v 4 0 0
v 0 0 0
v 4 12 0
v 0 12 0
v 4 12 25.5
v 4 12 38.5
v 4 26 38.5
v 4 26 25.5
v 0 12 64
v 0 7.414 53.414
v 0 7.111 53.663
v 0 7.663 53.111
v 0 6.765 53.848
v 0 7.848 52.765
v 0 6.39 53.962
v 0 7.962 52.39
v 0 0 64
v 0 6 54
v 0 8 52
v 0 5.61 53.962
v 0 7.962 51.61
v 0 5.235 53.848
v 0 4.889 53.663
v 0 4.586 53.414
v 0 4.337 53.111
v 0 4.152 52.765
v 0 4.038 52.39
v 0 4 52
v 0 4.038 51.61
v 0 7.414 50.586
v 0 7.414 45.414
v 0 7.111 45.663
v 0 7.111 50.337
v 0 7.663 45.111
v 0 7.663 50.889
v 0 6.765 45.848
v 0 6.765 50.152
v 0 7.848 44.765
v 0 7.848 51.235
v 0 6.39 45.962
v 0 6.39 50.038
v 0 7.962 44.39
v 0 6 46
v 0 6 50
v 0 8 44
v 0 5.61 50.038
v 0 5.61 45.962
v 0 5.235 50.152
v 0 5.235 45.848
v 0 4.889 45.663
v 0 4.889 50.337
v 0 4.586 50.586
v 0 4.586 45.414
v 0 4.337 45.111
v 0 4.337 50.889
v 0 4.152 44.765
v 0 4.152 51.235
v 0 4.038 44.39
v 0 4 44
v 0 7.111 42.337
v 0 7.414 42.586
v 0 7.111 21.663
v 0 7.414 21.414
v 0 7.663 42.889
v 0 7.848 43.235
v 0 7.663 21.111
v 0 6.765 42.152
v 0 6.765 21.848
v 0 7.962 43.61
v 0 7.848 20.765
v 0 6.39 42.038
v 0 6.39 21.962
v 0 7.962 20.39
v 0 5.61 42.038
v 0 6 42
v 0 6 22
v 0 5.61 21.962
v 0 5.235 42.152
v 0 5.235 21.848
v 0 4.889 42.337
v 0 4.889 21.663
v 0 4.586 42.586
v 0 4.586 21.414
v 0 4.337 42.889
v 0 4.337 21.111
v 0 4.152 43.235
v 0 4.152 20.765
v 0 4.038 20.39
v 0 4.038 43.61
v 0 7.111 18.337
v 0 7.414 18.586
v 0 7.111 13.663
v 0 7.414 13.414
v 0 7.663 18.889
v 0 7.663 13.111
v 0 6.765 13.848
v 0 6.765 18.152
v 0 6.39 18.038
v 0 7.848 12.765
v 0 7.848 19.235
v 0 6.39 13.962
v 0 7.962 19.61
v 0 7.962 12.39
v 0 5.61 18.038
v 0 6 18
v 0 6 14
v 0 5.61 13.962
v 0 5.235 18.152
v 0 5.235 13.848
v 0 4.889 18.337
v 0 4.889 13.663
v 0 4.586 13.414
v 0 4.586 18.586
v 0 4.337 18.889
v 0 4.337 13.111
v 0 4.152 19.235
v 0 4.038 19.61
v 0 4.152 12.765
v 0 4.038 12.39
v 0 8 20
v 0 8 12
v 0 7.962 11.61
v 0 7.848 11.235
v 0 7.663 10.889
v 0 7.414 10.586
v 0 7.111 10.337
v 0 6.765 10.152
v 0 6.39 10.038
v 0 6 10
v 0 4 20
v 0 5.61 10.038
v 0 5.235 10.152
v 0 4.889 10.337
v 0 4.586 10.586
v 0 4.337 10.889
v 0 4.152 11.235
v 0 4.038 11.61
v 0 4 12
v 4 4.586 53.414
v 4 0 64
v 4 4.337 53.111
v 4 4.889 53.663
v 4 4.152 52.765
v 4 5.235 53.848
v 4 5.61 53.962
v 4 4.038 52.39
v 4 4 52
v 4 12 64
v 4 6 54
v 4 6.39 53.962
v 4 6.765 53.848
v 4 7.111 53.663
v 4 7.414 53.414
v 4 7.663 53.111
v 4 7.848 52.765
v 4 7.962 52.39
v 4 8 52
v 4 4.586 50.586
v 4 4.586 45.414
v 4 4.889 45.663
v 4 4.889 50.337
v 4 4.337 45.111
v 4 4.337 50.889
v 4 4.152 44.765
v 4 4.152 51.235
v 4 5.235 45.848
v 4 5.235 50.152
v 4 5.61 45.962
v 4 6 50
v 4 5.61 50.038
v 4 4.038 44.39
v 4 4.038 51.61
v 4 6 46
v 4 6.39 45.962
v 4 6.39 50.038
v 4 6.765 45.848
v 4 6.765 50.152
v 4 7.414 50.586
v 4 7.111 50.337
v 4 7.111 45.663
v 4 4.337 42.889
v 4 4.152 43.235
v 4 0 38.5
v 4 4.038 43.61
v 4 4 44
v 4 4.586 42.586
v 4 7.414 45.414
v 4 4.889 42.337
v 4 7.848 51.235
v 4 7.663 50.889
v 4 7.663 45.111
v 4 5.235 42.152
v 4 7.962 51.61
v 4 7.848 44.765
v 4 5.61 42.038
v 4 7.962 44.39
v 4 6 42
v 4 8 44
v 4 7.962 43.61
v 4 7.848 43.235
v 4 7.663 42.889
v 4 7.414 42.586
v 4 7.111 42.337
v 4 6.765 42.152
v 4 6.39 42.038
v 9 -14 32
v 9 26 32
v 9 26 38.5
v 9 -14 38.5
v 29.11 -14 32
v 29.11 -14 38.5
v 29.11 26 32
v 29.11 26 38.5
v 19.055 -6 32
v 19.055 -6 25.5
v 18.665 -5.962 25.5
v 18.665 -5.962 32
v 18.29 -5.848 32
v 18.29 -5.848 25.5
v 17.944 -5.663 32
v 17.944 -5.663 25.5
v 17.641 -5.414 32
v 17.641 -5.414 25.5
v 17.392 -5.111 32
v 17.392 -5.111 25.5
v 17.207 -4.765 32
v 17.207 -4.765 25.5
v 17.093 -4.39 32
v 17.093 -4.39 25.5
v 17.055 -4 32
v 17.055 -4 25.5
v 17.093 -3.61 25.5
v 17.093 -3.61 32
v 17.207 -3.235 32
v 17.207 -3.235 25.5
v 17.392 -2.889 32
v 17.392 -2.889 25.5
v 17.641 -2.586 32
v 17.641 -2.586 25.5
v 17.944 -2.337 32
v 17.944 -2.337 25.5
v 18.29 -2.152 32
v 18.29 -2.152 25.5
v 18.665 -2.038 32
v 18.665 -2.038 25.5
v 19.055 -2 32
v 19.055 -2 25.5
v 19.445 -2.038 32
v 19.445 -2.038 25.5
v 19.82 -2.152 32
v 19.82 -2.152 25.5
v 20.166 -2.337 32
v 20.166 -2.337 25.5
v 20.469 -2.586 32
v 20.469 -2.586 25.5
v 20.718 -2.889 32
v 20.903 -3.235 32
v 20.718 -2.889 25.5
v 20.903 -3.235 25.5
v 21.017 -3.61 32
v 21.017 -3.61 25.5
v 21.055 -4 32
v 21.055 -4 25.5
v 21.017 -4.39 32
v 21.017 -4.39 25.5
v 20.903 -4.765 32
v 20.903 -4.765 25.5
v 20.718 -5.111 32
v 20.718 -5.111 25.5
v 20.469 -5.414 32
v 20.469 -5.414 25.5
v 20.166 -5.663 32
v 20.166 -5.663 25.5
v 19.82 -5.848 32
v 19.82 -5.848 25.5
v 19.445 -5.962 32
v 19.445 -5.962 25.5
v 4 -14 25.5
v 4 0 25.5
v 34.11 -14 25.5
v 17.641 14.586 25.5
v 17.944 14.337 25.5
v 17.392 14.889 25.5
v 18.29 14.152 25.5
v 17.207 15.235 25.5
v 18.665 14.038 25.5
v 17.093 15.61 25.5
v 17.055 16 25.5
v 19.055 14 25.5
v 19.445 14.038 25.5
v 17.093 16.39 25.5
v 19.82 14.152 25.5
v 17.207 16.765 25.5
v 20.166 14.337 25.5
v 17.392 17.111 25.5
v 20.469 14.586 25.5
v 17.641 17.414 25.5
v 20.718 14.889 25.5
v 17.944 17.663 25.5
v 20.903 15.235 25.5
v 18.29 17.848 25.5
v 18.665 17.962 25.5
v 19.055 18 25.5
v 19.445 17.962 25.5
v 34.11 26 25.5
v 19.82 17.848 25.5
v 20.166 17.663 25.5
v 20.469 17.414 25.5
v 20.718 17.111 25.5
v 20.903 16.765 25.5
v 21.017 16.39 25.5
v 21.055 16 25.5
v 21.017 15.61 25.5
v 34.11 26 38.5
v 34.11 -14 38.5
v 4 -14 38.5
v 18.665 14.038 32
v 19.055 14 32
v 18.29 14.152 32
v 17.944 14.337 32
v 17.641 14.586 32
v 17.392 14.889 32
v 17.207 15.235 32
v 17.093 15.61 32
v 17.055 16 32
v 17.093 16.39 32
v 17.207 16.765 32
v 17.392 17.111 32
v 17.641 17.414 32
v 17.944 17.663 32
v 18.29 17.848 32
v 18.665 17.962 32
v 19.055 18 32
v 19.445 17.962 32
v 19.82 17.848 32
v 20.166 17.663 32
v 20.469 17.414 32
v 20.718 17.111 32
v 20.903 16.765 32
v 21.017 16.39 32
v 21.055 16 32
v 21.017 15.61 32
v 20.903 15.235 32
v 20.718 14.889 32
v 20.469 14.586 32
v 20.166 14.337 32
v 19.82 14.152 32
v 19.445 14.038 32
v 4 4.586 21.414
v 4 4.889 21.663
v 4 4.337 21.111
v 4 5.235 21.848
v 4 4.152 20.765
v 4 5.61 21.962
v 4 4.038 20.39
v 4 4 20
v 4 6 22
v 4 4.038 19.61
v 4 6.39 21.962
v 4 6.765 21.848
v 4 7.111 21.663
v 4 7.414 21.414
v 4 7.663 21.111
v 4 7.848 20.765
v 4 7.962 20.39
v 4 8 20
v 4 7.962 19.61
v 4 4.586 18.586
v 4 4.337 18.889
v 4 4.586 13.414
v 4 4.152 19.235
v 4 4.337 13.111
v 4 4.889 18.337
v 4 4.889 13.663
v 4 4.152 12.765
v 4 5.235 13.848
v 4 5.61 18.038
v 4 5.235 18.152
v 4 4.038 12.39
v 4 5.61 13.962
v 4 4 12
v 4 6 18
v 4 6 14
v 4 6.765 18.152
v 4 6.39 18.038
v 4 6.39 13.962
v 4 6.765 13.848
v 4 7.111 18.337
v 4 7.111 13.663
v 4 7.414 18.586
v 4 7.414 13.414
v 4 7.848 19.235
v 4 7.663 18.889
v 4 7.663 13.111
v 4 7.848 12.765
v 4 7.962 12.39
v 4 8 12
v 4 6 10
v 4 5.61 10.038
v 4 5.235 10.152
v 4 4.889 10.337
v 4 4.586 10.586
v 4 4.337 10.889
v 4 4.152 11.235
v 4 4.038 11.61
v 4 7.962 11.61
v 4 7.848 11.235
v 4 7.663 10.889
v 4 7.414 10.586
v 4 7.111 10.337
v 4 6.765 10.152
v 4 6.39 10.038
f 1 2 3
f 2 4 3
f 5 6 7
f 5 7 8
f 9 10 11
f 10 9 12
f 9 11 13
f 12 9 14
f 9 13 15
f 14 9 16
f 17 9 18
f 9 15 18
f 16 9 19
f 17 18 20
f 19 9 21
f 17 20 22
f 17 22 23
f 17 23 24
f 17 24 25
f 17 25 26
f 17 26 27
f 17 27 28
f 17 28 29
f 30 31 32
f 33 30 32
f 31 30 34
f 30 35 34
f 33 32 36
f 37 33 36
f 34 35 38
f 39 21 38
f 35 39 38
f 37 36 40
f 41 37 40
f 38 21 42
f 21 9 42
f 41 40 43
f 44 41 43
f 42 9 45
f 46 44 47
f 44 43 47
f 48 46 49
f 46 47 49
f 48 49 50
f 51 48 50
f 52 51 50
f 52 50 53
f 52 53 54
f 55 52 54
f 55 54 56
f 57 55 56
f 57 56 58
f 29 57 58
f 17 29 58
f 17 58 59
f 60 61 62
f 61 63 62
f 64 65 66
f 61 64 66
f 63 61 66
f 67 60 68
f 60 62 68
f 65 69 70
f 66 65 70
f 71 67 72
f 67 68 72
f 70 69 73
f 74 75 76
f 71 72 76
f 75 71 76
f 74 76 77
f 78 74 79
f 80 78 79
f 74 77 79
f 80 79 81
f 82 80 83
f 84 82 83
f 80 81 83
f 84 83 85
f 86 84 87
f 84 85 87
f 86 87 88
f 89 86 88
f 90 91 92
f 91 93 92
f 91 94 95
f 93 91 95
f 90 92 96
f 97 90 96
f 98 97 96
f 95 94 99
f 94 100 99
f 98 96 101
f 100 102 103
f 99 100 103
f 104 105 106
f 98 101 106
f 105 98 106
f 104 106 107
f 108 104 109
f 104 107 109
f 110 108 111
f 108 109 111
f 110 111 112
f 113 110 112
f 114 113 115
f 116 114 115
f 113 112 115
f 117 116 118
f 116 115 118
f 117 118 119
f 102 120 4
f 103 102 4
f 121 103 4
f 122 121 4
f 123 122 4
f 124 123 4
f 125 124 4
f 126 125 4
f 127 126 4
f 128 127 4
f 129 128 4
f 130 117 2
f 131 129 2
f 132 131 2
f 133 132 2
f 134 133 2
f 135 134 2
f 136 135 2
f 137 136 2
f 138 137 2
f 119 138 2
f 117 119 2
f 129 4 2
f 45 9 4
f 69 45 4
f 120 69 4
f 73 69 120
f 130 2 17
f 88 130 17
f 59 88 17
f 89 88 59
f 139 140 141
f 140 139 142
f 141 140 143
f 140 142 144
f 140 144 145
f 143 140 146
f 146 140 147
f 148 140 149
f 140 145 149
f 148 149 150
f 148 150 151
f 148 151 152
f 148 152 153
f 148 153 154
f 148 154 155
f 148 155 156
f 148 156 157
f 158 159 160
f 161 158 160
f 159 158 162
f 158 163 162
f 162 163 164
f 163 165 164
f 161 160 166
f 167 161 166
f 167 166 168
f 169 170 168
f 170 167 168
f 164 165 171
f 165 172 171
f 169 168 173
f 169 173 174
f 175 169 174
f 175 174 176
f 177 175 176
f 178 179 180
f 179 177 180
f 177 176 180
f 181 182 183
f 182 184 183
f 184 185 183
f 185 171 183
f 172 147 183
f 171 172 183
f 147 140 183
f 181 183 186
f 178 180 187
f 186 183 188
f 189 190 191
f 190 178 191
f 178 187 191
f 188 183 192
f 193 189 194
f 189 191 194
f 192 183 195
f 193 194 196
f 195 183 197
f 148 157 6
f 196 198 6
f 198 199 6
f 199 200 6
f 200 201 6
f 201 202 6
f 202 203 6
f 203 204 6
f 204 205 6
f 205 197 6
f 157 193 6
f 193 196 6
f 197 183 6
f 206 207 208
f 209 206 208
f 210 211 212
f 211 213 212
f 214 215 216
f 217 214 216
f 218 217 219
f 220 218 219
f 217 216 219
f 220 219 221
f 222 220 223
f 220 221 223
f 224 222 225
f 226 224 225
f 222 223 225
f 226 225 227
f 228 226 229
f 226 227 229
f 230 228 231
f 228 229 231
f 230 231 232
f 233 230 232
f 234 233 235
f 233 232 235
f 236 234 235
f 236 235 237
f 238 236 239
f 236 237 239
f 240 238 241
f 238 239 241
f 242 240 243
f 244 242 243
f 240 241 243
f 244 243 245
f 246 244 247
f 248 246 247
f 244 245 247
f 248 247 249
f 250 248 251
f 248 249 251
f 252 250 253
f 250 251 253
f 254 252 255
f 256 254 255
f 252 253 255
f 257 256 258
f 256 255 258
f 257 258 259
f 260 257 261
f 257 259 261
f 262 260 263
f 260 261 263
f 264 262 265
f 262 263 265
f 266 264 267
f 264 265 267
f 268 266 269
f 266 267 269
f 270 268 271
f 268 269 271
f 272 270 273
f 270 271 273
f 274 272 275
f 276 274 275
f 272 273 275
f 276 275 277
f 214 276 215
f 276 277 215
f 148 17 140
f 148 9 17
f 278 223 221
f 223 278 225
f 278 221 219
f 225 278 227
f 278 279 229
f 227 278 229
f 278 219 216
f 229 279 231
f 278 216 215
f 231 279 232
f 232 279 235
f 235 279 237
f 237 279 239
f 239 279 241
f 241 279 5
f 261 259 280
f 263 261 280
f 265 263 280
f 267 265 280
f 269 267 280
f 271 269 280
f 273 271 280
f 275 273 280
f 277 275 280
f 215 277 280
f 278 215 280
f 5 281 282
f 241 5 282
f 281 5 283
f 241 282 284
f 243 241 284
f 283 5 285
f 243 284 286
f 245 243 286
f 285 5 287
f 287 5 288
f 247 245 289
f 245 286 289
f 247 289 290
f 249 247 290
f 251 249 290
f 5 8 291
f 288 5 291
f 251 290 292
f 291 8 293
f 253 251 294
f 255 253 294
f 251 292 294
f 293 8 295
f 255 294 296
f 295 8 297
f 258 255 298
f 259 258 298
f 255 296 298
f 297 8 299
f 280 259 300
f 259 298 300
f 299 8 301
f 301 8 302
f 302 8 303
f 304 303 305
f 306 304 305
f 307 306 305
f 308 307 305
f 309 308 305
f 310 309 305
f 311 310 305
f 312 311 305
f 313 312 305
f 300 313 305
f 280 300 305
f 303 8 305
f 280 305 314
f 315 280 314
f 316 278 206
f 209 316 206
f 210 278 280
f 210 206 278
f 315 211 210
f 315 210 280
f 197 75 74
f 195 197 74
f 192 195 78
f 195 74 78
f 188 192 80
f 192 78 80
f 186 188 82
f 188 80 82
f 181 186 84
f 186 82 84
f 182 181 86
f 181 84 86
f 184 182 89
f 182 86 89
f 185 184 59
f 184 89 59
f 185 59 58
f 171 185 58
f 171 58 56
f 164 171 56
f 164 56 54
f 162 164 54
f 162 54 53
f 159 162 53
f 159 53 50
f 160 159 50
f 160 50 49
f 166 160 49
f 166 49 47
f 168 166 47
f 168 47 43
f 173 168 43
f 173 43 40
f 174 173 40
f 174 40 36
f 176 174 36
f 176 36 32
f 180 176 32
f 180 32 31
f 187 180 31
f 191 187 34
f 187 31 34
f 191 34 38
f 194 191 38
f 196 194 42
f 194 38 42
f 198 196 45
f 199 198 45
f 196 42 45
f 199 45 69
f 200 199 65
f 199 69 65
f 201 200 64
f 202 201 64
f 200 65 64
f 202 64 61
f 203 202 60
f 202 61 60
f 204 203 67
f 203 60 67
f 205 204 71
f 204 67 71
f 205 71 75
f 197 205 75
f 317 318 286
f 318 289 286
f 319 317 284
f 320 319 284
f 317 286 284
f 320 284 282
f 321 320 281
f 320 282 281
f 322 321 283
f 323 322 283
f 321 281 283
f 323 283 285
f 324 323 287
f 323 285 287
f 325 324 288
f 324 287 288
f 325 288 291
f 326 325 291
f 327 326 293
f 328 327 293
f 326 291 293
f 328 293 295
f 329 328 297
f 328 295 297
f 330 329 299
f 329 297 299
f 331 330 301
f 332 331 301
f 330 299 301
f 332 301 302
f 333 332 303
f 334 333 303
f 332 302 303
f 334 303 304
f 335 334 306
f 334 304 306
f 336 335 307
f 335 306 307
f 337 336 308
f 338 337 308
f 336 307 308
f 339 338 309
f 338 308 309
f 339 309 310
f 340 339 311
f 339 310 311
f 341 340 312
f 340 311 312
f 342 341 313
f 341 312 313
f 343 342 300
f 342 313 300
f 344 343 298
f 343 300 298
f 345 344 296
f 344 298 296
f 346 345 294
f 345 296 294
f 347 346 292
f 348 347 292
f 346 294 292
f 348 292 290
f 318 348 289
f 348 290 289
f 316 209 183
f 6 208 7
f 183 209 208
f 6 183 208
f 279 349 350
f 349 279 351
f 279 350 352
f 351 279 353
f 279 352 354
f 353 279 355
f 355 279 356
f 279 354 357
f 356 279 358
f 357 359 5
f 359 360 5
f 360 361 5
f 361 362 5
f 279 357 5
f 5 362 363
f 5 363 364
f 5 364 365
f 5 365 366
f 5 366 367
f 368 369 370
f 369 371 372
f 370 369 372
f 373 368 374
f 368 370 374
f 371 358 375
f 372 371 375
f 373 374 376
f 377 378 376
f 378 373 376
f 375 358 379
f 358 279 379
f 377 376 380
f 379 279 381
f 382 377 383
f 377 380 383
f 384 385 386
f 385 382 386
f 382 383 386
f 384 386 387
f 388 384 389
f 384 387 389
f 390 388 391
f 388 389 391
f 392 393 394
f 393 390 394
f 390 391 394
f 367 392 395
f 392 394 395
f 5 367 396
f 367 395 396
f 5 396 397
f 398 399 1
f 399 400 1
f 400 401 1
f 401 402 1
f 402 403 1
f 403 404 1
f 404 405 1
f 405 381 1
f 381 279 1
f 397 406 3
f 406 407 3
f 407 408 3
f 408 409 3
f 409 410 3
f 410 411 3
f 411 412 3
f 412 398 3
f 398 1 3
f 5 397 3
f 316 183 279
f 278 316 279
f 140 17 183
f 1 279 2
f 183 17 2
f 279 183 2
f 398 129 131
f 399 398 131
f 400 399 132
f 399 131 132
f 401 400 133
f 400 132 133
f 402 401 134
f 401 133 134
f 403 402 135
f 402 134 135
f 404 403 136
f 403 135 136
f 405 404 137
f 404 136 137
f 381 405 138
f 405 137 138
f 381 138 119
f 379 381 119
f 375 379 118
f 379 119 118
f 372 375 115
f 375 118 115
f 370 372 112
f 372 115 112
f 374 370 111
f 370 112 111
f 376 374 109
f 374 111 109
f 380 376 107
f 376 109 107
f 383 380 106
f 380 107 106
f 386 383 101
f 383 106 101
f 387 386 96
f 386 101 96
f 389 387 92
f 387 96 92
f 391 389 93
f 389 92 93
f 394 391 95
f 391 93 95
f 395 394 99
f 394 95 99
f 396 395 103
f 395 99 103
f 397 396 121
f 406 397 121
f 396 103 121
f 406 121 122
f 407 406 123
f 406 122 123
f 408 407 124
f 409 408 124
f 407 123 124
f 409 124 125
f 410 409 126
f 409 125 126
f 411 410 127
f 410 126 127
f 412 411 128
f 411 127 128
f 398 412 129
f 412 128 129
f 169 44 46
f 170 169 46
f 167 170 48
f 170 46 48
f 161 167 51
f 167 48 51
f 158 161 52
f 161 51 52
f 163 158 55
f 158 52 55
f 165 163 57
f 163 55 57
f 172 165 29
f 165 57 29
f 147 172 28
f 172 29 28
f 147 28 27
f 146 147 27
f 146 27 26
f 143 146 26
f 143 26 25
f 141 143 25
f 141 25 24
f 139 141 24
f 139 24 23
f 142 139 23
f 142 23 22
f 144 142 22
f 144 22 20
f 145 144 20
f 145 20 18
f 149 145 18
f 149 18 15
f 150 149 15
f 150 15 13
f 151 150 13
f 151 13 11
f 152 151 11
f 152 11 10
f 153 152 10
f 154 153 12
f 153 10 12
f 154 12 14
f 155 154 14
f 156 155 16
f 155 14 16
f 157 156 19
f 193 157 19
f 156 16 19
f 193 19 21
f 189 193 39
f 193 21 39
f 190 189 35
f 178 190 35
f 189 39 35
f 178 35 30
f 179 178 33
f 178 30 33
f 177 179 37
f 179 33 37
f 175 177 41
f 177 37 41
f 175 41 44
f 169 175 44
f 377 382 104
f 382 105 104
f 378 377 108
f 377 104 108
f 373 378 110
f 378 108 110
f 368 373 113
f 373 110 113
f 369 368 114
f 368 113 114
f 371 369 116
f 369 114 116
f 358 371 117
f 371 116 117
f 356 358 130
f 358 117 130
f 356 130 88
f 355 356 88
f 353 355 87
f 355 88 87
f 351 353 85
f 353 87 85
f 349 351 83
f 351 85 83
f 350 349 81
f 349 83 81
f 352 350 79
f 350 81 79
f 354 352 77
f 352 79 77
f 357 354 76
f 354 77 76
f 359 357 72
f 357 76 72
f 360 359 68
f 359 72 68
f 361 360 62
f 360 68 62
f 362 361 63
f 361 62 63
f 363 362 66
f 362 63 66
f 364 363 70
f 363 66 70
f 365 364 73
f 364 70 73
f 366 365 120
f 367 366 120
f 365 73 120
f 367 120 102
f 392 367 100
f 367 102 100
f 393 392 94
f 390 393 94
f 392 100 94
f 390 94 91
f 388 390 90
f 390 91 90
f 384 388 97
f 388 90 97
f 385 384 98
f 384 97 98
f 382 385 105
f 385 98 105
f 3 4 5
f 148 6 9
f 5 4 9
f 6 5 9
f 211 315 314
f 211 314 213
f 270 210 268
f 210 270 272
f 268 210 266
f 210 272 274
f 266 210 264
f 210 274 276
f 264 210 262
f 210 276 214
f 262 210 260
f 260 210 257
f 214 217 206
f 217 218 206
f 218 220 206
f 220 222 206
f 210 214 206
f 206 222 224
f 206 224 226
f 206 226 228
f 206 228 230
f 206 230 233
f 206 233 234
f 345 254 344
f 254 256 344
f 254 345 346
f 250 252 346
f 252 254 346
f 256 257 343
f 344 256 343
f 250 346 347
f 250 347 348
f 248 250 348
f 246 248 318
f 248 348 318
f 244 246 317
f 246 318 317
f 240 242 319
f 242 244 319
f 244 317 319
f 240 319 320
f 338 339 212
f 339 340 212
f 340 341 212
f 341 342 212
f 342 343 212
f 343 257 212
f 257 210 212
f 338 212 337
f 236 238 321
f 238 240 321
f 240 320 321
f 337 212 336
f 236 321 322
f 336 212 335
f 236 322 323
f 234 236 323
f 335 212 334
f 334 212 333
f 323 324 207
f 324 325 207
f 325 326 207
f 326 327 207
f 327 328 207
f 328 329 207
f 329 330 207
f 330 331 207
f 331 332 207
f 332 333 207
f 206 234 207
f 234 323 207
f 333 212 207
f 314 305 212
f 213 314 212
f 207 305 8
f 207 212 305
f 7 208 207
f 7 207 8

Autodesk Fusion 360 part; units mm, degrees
sketch "Sketch1" plane through (0, 0, 0) normal (0, 0, 1) x (1, 0, 0)
  line L0 (0, 0) -> (4, 0)
  line L1 (4, 0) -> (4, 12)
  line L2 (4, 12) -> (0, 12)
  line L3 (0, 12) -> (0, 0)
  dimension "d1" = 12
  dimension "d2" = 4
extrude "Extrude1" add sketch "Sketch1" along normal blind 64
sketch "Sketch2" plane through (4, 0, 0) normal (1, 0, 0) x (0, 1, 0)
  line L0 (0, 0) -> (12, 0)
  line L1 (12, 0) -> (12, 64)
  line L2 (12, 64) -> (0, 64)
  line L3 (0, 64) -> (0, 0)
  line L4 (0, 64) -> (12, 0) construction
  line L5 (12, 64) -> (0, 0) construction
  line L6 (12, 38.5) -> (0, 38.5)
  line L7 (0, 38.5) -> (0, 25.5)
  line L8 (0, 25.5) -> (12, 25.5)
  line L9 (12, 25.5) -> (12, 38.5)
  line L10 (12, 38.5) -> (0, 25.5) construction
  line L11 (0, 38.5) -> (12, 25.5) construction
  line L12 (6, 32) -> (6, 36) construction
  line L13 (6, 36) -> (6, 44) construction
  line L14 (6, 44) -> (6, 52) construction
  line L15 (6, 32) -> (6, 28) construction
  line L16 (6, 28) -> (6, 20) construction
  line L17 (6, 20) -> (6, 12) construction
  point P0 (6, 32)
  point P1 (6, 52)
  point P2 (6, 44)
  point P3 (6, 36)
  point P4 (6, 28)
  point P5 (6, 20)
  point P6 (6, 12)
  dimension "d5" = 13
  dimension "d6" = 4
  dimension "d7" = 8
  dimension "d8" = 8
  dimension "d9" = 4
  dimension "d10" = 8
  dimension "d11" = 8
  dimension "d20" = 12
extrude "Extrude2" add sketch "Sketch2" along normal blind 5 contours L1 L3 L6 L7 L8 L9
sketch "Sketch3" plane through (9, 0, 0) normal (1, 0, 0) x (0, 1, 0)
  line L0 (12, 25.5) -> (12, 38.5)
  line L1 (12, 38.5) -> (0, 38.5)
  line L2 (0, 38.5) -> (0, 25.5)
  line L3 (0, 25.5) -> (12, 25.5)
  line L4 (0, 25.5) -> (12, 25.5)
  line L5 (12, 25.5) -> (12, 32)
  line L6 (12, 32) -> (0, 32)
  line L7 (0, 32) -> (0, 25.5)
extrude "Extrude3" add sketch "Sketch3" along normal blind 20.11 contours L0 L2 L3 L4 L5 L6 L7
sketch "Sketch4" plane through (29.11, 0, 0) normal (1, 0, 0) x (0, 1, 0)
  line L0 (0, 32) -> (0, 25.5)
  line L1 (0, 25.5) -> (12, 25.5)
  line L2 (12, 25.5) -> (12, 32)
  line L3 (12, 32) -> (0, 32)
  line L4 (0, 25.5) -> (12, 25.5)
  line L5 (12, 25.5) -> (12, 38.5)
  line L6 (12, 38.5) -> (0, 38.5)
  line L7 (0, 38.5) -> (0, 25.5)
  dimension "d16" = 12
  dimension "d17" = 13
extrude "Extrude4" add sketch "Sketch4" along normal blind 5
sketch "Sketch5" plane through (0, 0, 32) normal (0, 0, 1) x (-1, 0, 0)
  line L0 (-9, -12) -> (-9, 0)
  line L1 (-9, 0) -> (-29.11, 0)
  line L2 (-29.11, 0) -> (-29.11, -12)
  line L3 (-29.11, -12) -> (-9, -12)
hole "Hole1" at (4, 6, 52) at (4, 6, 44) at (4, 6, 20) at (4, 6, 12) direction (-1, 0, 0) diameter 4 depth 15 tip angle 180
sketch "Sketch6" plane through (0, 12, 0) normal (0, 1, 0) x (-1, 0, 0)
  line L0 (-4, 0) -> (0, 0)
  line L1 (0, 0) -> (0, 64)
  line L2 (0, 64) -> (-4, 64)
  line L3 (-4, 64) -> (-4, 38.5)
  line L4 (-4, 38.5) -> (-9, 38.5)
  line L5 (-9, 38.5) -> (-9, 32)
  line L6 (-9, 32) -> (-29.11, 32)
  line L7 (-29.11, 32) -> (-29.11, 38.5)
  line L8 (-29.11, 38.5) -> (-34.11, 38.5)
  line L9 (-34.11, 38.5) -> (-34.11, 25.5)
  line L10 (-34.11, 25.5) -> (-4, 25.5)
  line L11 (-4, 25.5) -> (-4, 0)
  line L12 (-4, 38.5) -> (-4, 25.5)
  line L13 (-4, 38.5) -> (-9, 38.5)
  line L14 (-9, 38.5) -> (-9, 32)
  line L15 (-9, 32) -> (-29.11, 32)
  line L16 (-29.11, 38.5) -> (-29.11, 32)
  line L17 (-29.11, 38.5) -> (-34.11, 38.5)
  line L18 (-34.11, 25.5) -> (-34.11, 38.5)
  line L19 (-4, 25.5) -> (-34.11, 25.5)
extrude "Extrude5" add sketch "Sketch6" along normal blind 14 contours L4 L5 L6 L7 L8 L9 L10 L12 L13 L14 L15 L16 L17 L18 L19
sketch "Sketch7" plane through (0, 0, 0) normal (0, -1, 0) x (1, 0, 0)
  line L0 (0, 0) -> (4, 0)
  line L1 (4, 0) -> (4, 25.5)
  line L2 (4, 25.5) -> (34.11, 25.5)
  line L3 (34.11, 25.5) -> (34.11, 38.5)
  line L4 (34.11, 38.5) -> (29.11, 38.5)
  line L5 (29.11, 38.5) -> (29.11, 32)
  line L6 (29.11, 32) -> (9, 32)
  line L7 (9, 32) -> (9, 38.5)
  line L8 (9, 38.5) -> (4, 38.5)
  line L9 (4, 38.5) -> (4, 64)
  line L10 (4, 64) -> (0, 64)
  line L11 (0, 64) -> (0, 0)
  line L12 (4, 38.5) -> (4, 25.5)
  line L13 (4, 25.5) -> (34.11, 25.5)
  line L14 (34.11, 25.5) -> (34.11, 38.5)
  line L15 (34.11, 38.5) -> (29.11, 38.5)
  line L16 (29.11, 38.5) -> (29.11, 32)
  line L17 (29.11, 32) -> (9, 32)
  line L18 (9, 32) -> (9, 38.5)
  line L19 (9, 38.5) -> (4, 38.5)
extrude "Extrude6" add sketch "Sketch7" along normal blind 14 contours L2 L3 L4 L5 L6 L7 L8 L12 L13 L14 L15 L16 L17 L18 L19
sketch "Sketch8" plane through (0, 0, 32) normal (0, 0, 1) x (-1, 0, 0)
  line L0 (-9, -26) -> (-9, 14)
  line L1 (-9, 14) -> (-29.11, 14)
  line L2 (-29.11, 14) -> (-29.11, -26)
  line L3 (-29.11, -26) -> (-9, -26)
  line L4 (-9, -26) -> (-29.11, 14) construction
  line L5 (-29.11, -26) -> (-9, 14) construction
  line L6 (-19.055, -6) -> (-19.055, -16) construction
  line L7 (-19.055, -6) -> (-19.055, 4)
  dimension "d28" = 10
  dimension "d29" = 10
hole "Hole2" at (19.055, -4, 32) at (19.055, 16, 32) direction (0, 0, -1) diameter 4 depth 50 tip angle 180
